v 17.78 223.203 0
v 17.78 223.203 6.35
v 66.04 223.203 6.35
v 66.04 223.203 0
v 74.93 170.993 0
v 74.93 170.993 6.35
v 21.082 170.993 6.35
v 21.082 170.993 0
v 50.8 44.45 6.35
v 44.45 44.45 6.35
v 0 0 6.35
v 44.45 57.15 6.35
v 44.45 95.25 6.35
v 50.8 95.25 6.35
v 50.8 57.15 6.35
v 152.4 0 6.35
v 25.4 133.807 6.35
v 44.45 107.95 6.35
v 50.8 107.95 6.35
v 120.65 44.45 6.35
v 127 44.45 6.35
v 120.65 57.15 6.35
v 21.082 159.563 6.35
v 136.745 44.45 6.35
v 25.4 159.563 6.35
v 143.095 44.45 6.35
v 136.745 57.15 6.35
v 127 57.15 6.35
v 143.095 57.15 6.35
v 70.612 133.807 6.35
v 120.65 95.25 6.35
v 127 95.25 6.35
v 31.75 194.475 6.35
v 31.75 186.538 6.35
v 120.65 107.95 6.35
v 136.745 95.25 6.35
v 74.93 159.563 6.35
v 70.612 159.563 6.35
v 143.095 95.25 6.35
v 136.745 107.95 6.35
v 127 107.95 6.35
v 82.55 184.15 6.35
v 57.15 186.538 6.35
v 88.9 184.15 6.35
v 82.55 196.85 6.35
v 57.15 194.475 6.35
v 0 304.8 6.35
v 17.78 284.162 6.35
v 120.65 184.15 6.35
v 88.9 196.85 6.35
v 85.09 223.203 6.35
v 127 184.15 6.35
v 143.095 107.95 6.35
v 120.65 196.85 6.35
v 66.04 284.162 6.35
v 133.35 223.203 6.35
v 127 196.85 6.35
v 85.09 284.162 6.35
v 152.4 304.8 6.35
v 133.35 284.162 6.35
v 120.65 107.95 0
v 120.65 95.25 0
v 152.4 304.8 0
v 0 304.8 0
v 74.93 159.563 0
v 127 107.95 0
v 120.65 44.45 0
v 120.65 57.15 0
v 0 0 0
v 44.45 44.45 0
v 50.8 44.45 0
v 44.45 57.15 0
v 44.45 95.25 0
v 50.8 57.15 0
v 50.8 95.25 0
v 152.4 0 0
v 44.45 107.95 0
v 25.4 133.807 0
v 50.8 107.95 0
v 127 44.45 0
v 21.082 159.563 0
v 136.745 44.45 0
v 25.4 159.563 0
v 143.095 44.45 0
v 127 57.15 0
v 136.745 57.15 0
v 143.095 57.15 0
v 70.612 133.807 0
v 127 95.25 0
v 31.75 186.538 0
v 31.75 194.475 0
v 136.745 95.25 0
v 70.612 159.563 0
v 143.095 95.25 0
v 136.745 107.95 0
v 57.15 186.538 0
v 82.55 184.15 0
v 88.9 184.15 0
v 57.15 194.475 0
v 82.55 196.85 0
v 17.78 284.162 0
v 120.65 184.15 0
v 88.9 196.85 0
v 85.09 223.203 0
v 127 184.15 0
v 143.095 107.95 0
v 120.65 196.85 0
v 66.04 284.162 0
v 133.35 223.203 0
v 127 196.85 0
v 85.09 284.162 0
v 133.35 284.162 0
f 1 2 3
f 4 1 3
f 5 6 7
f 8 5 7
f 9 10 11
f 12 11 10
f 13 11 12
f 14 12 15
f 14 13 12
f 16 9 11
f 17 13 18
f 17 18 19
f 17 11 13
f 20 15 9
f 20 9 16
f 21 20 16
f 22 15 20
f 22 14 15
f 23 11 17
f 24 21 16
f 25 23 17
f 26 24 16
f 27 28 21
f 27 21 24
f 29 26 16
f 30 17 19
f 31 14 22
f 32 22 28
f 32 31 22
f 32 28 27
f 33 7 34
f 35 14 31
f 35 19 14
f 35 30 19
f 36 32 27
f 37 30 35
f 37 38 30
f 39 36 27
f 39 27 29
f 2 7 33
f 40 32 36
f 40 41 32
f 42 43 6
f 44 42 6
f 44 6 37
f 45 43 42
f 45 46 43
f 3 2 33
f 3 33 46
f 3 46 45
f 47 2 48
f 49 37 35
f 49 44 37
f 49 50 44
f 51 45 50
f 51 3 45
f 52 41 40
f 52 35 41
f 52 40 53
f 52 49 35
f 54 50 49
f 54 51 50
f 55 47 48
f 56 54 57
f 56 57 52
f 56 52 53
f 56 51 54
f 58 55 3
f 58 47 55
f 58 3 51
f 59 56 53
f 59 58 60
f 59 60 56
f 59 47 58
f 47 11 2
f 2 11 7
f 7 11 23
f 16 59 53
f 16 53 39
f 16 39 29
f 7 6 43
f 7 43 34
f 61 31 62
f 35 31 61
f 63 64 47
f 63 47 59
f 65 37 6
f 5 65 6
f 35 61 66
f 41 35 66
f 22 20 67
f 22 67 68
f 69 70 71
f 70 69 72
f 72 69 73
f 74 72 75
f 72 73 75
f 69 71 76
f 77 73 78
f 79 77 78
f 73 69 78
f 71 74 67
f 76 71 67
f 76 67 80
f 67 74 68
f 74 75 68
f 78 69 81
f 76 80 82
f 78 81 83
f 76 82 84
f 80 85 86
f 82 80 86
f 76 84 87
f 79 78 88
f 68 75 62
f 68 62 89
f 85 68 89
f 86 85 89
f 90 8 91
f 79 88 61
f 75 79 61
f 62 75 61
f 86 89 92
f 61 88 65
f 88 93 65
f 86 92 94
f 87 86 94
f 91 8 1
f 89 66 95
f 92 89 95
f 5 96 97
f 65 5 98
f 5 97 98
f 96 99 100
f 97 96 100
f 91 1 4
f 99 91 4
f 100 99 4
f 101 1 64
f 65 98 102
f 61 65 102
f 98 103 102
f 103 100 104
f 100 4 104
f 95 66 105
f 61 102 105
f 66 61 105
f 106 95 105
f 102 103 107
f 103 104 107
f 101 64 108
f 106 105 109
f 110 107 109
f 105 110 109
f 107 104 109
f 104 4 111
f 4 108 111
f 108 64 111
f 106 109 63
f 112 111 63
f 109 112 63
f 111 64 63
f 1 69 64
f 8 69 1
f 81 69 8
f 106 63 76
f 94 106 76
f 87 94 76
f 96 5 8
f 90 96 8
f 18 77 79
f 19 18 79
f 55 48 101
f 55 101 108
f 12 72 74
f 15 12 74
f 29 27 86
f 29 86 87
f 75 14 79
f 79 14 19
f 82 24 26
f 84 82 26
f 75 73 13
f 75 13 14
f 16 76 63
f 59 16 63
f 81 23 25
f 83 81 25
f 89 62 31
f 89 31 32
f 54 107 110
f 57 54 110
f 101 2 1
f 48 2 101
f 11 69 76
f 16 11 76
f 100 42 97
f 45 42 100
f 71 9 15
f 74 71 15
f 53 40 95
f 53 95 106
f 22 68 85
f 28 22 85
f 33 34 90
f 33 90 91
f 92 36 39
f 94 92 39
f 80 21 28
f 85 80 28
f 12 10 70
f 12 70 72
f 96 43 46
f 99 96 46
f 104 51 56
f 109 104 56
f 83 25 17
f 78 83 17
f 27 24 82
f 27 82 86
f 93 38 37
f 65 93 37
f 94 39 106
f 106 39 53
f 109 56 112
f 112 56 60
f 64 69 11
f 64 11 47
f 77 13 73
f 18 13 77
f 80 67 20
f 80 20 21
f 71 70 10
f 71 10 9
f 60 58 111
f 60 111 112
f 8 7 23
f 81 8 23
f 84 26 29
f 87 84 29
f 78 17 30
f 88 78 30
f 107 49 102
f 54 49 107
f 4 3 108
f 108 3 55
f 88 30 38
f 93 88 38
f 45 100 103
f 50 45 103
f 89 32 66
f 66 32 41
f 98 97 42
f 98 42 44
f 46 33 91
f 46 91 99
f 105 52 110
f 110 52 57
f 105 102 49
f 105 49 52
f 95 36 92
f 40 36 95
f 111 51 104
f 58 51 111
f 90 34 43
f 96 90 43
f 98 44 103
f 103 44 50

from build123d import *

# Parameters (mm, degrees)
F0_W     = 152.4
F0_H     = 304.8
F1_DEPTH = 6.35
F2_W     = 6.35
F2_H     = 12.7
F2_W_2   = 48.26
F2_H_2   = 60.96
F2_W_3   = 25.4
F2_H_3   = 7.9375
F3_DEPTH = 6.351
F4_W     = 6.35
F4_H     = 12.7
F5_DEPTH = 25.4


with BuildPart() as f1:
    # F0 (on Top) → F1 (new body)
    with BuildSketch(Plane.XY):
        with Locations((76.2, 152.4)):
            Rectangle(F0_W, F0_H)
    extrude(amount=F1_DEPTH)

    # F2 (on face) → F3 (cut, through all)
    with BuildSketch(Plane.XY.offset(6.35)):
        with Locations((123.825, 50.8)):
            Rectangle(F2_W, F2_H)
        with Locations((47.625, 50.8)):
            Rectangle(F2_W, F2_H)
        with Locations((123.825, 101.6)):
            Rectangle(F2_W, F2_H)
        with Locations((47.625, 101.6)):
            Rectangle(F2_W, F2_H)
        with Locations((123.825, 190.5)):
            Rectangle(F2_W, F2_H)
        with Locations((85.725, 190.5)):
            Rectangle(F2_W, F2_H)
        with Locations((109.22, 253.6825)):
            Rectangle(F2_W_2, F2_H_2)
        with Locations((44.45, 190.50635)):
            Rectangle(F2_W_3, F2_H_3)
        Polygon((25.4, 159.5628), (25.4, 133.8072), (70.612, 133.8072), (70.612, 159.5628), (74.93, 159.5628), (74.93, 170.9928), (21.082, 170.9928), (21.082, 159.5628), align=None)
        with Locations((41.91, 253.6825)):
            Rectangle(F2_W_2, F2_H_2)
    extrude(amount=-F3_DEPTH, mode=Mode.SUBTRACT)

    # F4 (on face) → F5 (cut)
    with BuildSketch(Plane.XY.offset(6.35)):
        with Locations((139.920227, 50.8)):
            Rectangle(F4_W, F4_H)
        with Locations((139.920227, 101.6)):
            Rectangle(F4_W, F4_H)
    extrude(amount=-F5_DEPTH, mode=Mode.SUBTRACT)


solid = f1.part
